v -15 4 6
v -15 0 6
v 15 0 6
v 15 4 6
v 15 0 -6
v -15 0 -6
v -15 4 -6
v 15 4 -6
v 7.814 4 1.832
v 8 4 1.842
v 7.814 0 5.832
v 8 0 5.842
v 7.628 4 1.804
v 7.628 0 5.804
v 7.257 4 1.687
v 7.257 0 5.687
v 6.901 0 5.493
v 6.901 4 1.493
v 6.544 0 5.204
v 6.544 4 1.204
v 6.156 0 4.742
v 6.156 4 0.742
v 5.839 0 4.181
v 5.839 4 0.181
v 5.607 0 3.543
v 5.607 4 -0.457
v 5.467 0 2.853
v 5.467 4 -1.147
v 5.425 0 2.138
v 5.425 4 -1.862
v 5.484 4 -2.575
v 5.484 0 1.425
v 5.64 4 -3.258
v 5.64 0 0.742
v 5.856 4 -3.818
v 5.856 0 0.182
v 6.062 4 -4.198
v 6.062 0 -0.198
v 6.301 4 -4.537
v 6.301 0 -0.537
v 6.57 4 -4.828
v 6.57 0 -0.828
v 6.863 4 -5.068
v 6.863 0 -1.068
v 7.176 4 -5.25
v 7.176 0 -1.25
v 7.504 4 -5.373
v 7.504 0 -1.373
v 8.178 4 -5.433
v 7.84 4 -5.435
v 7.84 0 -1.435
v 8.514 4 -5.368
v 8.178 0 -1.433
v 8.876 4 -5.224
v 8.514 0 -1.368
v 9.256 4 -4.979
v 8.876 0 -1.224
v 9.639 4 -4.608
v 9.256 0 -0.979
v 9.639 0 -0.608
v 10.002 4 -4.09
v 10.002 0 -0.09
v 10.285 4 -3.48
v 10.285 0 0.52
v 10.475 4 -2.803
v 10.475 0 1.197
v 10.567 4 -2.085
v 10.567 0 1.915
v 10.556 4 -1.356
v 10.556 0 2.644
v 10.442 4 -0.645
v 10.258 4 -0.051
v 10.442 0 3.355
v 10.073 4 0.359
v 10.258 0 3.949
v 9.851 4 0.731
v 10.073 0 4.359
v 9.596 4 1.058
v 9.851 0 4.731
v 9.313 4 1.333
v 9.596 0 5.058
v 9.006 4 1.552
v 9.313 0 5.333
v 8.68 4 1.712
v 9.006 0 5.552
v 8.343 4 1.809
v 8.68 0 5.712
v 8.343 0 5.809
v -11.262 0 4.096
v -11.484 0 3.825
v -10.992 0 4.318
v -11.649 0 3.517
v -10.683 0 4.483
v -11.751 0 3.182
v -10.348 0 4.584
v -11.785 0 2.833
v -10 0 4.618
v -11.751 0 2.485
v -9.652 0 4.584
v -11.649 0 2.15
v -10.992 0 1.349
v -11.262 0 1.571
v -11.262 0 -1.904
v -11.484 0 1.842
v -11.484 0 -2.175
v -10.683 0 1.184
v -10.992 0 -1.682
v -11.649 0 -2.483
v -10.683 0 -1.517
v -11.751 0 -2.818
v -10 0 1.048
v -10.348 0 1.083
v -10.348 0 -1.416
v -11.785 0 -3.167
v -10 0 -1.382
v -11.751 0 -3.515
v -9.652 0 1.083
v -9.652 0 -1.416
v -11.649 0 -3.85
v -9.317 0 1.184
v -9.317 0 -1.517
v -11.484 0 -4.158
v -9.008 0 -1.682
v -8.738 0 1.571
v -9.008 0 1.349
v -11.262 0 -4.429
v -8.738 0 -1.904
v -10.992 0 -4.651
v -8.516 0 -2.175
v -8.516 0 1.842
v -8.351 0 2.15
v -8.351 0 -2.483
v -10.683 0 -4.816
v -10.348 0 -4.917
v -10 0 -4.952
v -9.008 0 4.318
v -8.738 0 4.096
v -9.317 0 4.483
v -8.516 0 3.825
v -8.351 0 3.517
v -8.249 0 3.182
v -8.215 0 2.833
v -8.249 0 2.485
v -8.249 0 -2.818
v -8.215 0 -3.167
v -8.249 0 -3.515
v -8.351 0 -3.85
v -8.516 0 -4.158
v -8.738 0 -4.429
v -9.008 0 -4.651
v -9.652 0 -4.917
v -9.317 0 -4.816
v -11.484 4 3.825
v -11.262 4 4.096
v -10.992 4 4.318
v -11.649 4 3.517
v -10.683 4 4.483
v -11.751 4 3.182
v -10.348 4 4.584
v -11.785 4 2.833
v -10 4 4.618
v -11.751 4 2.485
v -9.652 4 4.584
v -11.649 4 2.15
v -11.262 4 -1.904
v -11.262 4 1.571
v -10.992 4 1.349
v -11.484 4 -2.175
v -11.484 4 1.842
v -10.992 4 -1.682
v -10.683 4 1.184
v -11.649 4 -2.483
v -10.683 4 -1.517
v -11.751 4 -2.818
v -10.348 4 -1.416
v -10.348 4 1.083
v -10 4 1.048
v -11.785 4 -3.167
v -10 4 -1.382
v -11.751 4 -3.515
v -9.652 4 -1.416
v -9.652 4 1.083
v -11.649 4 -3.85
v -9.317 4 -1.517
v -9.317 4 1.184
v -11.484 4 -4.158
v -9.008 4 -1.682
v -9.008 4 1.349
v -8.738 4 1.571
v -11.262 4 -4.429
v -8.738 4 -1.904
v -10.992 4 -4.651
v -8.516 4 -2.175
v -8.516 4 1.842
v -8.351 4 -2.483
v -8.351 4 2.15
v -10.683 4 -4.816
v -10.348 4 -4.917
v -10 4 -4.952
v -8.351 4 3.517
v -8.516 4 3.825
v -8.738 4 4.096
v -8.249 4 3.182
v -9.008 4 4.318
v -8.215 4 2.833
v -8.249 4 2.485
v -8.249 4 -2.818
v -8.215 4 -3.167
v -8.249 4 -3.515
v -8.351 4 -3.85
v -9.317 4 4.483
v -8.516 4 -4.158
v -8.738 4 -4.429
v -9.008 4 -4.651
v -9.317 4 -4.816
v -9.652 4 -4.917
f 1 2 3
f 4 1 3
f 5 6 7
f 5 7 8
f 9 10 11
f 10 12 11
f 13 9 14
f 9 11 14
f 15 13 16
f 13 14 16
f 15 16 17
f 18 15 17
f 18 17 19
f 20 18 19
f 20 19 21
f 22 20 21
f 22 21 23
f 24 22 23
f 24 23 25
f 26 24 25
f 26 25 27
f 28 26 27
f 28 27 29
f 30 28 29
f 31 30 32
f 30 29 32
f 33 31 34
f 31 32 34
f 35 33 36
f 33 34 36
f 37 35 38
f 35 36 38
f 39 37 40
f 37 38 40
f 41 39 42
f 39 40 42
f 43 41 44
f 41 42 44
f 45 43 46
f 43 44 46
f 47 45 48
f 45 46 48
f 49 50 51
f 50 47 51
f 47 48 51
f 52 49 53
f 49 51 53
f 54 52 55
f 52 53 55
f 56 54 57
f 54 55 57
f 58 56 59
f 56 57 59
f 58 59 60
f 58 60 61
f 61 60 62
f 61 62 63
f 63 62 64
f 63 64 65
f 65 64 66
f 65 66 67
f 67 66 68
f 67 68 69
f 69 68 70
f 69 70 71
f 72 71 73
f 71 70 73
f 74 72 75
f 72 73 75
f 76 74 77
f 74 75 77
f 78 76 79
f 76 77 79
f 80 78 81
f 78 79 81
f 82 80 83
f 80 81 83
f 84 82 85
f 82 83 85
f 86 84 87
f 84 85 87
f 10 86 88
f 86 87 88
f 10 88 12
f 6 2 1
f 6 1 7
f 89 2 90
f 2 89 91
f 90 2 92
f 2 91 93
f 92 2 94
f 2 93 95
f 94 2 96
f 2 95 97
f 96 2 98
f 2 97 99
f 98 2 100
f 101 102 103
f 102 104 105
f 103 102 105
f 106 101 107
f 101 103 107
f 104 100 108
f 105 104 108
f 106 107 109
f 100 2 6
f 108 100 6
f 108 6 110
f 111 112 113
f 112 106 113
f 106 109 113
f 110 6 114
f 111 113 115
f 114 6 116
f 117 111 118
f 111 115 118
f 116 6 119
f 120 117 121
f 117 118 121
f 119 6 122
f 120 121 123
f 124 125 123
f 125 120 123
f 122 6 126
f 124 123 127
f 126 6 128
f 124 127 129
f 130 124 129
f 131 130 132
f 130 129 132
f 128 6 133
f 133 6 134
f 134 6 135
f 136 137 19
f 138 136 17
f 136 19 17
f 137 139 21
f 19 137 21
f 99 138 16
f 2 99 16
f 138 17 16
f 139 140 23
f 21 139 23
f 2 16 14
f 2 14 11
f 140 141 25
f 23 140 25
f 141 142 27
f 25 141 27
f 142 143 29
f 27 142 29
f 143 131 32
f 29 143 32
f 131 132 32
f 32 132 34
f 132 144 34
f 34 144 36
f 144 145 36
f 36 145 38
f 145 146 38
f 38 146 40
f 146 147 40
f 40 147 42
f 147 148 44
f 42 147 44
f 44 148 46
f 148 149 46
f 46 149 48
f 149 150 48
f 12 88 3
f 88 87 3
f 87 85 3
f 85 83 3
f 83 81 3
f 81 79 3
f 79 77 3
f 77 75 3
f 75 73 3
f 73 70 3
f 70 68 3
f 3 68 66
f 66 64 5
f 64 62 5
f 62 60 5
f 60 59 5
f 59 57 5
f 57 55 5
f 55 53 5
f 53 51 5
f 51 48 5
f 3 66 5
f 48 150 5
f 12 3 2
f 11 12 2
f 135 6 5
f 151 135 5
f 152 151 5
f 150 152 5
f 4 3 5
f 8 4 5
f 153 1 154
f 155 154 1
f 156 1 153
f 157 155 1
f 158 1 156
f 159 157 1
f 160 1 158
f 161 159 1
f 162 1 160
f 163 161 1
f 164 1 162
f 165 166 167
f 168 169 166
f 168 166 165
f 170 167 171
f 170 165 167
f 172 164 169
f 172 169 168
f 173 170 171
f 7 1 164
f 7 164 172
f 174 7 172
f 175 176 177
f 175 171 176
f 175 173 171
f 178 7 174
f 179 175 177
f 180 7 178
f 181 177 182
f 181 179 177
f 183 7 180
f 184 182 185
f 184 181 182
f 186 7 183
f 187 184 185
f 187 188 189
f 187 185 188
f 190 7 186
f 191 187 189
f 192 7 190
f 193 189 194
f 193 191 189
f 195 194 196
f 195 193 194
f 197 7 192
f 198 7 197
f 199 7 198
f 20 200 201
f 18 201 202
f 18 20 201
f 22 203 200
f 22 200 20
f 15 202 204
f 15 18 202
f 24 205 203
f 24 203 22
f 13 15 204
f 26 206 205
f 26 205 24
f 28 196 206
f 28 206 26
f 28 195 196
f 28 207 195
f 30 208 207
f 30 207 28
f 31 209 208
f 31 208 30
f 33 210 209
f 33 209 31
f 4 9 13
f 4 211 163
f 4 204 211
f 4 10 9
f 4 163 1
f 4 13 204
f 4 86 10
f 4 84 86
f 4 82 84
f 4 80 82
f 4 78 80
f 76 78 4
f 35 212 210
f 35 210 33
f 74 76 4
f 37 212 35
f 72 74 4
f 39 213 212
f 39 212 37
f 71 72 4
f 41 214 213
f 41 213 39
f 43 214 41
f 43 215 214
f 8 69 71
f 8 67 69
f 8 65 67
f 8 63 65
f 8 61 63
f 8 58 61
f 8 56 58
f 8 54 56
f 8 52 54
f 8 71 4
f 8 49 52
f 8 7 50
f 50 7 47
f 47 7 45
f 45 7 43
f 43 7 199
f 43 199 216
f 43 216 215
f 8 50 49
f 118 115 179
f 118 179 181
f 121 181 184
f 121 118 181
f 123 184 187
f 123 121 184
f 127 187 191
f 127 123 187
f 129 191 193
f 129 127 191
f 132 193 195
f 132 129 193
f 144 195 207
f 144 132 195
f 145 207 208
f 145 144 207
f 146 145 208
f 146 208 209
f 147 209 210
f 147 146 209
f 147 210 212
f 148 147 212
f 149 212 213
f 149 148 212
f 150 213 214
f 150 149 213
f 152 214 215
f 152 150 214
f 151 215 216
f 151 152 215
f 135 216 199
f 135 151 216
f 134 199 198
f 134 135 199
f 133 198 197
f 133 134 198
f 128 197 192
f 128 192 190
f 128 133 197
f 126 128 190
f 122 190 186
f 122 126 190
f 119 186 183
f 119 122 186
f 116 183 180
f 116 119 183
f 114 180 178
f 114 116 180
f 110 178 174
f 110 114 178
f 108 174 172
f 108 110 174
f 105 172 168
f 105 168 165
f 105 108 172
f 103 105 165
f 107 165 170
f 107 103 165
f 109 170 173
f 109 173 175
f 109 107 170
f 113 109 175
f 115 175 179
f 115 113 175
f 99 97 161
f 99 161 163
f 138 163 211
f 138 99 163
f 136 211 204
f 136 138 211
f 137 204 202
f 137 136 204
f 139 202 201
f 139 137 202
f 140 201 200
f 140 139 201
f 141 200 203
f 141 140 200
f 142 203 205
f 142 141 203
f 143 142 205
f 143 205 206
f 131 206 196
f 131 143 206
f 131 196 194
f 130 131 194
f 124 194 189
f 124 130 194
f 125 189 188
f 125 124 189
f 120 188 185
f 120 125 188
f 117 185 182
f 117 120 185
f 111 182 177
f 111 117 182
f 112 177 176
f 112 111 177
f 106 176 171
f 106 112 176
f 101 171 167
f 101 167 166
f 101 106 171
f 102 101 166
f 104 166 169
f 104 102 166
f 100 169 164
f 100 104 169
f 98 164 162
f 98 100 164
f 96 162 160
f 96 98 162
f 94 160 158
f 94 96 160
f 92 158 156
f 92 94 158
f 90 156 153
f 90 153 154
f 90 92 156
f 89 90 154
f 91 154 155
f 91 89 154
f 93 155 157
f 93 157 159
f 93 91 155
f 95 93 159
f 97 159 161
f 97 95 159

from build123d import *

# Parameters (mm, degrees)
SCHIZZO1_W                   = 30
SCHIZZO1_H                   = 12
SCHIZZO1_R                   = 1.785023435
ESTRUSIONE_ESTRUSIONE1_DEPTH = 4
SCHIZZO3_R                   = 2.575
TAGLIO_ESTRUSIONE2_DEPTH     = 25


with BuildPart() as part:
    # Schizzo1 → Estrusione-Estrusione1 (new body)
    with BuildSketch(Plane(origin=(0, 0, 0), x_dir=(1, 0, 0), z_dir=(0, 1, 0))):
        Rectangle(SCHIZZO1_W, SCHIZZO1_H)
        with Locations(Location((-10, 3.166569094, 0), (0, 0, 270))):
            Circle(SCHIZZO1_R, mode=Mode.SUBTRACT)
        with Locations(Location((-10, -2.833430906, 0), (0, 0, 270))):
            Circle(SCHIZZO1_R, mode=Mode.SUBTRACT)
    extrude(amount=ESTRUSIONE_ESTRUSIONE1_DEPTH)

    # Schizzo3 → Taglio-Estrusione2 (cut, symmetric)
    with BuildSketch(Plane(origin=(0, 2.9, -2.9), x_dir=(1, 0, 0), z_dir=(0, -0.7071067811865512, 0.7071067811865438))):
        with Locations(Location((8, 1.555634919, 0), (0, 0, 90))):
            Circle(SCHIZZO3_R)
    extrude(amount=TAGLIO_ESTRUSIONE2_DEPTH, both=True, mode=Mode.SUBTRACT)


solid = part.part
